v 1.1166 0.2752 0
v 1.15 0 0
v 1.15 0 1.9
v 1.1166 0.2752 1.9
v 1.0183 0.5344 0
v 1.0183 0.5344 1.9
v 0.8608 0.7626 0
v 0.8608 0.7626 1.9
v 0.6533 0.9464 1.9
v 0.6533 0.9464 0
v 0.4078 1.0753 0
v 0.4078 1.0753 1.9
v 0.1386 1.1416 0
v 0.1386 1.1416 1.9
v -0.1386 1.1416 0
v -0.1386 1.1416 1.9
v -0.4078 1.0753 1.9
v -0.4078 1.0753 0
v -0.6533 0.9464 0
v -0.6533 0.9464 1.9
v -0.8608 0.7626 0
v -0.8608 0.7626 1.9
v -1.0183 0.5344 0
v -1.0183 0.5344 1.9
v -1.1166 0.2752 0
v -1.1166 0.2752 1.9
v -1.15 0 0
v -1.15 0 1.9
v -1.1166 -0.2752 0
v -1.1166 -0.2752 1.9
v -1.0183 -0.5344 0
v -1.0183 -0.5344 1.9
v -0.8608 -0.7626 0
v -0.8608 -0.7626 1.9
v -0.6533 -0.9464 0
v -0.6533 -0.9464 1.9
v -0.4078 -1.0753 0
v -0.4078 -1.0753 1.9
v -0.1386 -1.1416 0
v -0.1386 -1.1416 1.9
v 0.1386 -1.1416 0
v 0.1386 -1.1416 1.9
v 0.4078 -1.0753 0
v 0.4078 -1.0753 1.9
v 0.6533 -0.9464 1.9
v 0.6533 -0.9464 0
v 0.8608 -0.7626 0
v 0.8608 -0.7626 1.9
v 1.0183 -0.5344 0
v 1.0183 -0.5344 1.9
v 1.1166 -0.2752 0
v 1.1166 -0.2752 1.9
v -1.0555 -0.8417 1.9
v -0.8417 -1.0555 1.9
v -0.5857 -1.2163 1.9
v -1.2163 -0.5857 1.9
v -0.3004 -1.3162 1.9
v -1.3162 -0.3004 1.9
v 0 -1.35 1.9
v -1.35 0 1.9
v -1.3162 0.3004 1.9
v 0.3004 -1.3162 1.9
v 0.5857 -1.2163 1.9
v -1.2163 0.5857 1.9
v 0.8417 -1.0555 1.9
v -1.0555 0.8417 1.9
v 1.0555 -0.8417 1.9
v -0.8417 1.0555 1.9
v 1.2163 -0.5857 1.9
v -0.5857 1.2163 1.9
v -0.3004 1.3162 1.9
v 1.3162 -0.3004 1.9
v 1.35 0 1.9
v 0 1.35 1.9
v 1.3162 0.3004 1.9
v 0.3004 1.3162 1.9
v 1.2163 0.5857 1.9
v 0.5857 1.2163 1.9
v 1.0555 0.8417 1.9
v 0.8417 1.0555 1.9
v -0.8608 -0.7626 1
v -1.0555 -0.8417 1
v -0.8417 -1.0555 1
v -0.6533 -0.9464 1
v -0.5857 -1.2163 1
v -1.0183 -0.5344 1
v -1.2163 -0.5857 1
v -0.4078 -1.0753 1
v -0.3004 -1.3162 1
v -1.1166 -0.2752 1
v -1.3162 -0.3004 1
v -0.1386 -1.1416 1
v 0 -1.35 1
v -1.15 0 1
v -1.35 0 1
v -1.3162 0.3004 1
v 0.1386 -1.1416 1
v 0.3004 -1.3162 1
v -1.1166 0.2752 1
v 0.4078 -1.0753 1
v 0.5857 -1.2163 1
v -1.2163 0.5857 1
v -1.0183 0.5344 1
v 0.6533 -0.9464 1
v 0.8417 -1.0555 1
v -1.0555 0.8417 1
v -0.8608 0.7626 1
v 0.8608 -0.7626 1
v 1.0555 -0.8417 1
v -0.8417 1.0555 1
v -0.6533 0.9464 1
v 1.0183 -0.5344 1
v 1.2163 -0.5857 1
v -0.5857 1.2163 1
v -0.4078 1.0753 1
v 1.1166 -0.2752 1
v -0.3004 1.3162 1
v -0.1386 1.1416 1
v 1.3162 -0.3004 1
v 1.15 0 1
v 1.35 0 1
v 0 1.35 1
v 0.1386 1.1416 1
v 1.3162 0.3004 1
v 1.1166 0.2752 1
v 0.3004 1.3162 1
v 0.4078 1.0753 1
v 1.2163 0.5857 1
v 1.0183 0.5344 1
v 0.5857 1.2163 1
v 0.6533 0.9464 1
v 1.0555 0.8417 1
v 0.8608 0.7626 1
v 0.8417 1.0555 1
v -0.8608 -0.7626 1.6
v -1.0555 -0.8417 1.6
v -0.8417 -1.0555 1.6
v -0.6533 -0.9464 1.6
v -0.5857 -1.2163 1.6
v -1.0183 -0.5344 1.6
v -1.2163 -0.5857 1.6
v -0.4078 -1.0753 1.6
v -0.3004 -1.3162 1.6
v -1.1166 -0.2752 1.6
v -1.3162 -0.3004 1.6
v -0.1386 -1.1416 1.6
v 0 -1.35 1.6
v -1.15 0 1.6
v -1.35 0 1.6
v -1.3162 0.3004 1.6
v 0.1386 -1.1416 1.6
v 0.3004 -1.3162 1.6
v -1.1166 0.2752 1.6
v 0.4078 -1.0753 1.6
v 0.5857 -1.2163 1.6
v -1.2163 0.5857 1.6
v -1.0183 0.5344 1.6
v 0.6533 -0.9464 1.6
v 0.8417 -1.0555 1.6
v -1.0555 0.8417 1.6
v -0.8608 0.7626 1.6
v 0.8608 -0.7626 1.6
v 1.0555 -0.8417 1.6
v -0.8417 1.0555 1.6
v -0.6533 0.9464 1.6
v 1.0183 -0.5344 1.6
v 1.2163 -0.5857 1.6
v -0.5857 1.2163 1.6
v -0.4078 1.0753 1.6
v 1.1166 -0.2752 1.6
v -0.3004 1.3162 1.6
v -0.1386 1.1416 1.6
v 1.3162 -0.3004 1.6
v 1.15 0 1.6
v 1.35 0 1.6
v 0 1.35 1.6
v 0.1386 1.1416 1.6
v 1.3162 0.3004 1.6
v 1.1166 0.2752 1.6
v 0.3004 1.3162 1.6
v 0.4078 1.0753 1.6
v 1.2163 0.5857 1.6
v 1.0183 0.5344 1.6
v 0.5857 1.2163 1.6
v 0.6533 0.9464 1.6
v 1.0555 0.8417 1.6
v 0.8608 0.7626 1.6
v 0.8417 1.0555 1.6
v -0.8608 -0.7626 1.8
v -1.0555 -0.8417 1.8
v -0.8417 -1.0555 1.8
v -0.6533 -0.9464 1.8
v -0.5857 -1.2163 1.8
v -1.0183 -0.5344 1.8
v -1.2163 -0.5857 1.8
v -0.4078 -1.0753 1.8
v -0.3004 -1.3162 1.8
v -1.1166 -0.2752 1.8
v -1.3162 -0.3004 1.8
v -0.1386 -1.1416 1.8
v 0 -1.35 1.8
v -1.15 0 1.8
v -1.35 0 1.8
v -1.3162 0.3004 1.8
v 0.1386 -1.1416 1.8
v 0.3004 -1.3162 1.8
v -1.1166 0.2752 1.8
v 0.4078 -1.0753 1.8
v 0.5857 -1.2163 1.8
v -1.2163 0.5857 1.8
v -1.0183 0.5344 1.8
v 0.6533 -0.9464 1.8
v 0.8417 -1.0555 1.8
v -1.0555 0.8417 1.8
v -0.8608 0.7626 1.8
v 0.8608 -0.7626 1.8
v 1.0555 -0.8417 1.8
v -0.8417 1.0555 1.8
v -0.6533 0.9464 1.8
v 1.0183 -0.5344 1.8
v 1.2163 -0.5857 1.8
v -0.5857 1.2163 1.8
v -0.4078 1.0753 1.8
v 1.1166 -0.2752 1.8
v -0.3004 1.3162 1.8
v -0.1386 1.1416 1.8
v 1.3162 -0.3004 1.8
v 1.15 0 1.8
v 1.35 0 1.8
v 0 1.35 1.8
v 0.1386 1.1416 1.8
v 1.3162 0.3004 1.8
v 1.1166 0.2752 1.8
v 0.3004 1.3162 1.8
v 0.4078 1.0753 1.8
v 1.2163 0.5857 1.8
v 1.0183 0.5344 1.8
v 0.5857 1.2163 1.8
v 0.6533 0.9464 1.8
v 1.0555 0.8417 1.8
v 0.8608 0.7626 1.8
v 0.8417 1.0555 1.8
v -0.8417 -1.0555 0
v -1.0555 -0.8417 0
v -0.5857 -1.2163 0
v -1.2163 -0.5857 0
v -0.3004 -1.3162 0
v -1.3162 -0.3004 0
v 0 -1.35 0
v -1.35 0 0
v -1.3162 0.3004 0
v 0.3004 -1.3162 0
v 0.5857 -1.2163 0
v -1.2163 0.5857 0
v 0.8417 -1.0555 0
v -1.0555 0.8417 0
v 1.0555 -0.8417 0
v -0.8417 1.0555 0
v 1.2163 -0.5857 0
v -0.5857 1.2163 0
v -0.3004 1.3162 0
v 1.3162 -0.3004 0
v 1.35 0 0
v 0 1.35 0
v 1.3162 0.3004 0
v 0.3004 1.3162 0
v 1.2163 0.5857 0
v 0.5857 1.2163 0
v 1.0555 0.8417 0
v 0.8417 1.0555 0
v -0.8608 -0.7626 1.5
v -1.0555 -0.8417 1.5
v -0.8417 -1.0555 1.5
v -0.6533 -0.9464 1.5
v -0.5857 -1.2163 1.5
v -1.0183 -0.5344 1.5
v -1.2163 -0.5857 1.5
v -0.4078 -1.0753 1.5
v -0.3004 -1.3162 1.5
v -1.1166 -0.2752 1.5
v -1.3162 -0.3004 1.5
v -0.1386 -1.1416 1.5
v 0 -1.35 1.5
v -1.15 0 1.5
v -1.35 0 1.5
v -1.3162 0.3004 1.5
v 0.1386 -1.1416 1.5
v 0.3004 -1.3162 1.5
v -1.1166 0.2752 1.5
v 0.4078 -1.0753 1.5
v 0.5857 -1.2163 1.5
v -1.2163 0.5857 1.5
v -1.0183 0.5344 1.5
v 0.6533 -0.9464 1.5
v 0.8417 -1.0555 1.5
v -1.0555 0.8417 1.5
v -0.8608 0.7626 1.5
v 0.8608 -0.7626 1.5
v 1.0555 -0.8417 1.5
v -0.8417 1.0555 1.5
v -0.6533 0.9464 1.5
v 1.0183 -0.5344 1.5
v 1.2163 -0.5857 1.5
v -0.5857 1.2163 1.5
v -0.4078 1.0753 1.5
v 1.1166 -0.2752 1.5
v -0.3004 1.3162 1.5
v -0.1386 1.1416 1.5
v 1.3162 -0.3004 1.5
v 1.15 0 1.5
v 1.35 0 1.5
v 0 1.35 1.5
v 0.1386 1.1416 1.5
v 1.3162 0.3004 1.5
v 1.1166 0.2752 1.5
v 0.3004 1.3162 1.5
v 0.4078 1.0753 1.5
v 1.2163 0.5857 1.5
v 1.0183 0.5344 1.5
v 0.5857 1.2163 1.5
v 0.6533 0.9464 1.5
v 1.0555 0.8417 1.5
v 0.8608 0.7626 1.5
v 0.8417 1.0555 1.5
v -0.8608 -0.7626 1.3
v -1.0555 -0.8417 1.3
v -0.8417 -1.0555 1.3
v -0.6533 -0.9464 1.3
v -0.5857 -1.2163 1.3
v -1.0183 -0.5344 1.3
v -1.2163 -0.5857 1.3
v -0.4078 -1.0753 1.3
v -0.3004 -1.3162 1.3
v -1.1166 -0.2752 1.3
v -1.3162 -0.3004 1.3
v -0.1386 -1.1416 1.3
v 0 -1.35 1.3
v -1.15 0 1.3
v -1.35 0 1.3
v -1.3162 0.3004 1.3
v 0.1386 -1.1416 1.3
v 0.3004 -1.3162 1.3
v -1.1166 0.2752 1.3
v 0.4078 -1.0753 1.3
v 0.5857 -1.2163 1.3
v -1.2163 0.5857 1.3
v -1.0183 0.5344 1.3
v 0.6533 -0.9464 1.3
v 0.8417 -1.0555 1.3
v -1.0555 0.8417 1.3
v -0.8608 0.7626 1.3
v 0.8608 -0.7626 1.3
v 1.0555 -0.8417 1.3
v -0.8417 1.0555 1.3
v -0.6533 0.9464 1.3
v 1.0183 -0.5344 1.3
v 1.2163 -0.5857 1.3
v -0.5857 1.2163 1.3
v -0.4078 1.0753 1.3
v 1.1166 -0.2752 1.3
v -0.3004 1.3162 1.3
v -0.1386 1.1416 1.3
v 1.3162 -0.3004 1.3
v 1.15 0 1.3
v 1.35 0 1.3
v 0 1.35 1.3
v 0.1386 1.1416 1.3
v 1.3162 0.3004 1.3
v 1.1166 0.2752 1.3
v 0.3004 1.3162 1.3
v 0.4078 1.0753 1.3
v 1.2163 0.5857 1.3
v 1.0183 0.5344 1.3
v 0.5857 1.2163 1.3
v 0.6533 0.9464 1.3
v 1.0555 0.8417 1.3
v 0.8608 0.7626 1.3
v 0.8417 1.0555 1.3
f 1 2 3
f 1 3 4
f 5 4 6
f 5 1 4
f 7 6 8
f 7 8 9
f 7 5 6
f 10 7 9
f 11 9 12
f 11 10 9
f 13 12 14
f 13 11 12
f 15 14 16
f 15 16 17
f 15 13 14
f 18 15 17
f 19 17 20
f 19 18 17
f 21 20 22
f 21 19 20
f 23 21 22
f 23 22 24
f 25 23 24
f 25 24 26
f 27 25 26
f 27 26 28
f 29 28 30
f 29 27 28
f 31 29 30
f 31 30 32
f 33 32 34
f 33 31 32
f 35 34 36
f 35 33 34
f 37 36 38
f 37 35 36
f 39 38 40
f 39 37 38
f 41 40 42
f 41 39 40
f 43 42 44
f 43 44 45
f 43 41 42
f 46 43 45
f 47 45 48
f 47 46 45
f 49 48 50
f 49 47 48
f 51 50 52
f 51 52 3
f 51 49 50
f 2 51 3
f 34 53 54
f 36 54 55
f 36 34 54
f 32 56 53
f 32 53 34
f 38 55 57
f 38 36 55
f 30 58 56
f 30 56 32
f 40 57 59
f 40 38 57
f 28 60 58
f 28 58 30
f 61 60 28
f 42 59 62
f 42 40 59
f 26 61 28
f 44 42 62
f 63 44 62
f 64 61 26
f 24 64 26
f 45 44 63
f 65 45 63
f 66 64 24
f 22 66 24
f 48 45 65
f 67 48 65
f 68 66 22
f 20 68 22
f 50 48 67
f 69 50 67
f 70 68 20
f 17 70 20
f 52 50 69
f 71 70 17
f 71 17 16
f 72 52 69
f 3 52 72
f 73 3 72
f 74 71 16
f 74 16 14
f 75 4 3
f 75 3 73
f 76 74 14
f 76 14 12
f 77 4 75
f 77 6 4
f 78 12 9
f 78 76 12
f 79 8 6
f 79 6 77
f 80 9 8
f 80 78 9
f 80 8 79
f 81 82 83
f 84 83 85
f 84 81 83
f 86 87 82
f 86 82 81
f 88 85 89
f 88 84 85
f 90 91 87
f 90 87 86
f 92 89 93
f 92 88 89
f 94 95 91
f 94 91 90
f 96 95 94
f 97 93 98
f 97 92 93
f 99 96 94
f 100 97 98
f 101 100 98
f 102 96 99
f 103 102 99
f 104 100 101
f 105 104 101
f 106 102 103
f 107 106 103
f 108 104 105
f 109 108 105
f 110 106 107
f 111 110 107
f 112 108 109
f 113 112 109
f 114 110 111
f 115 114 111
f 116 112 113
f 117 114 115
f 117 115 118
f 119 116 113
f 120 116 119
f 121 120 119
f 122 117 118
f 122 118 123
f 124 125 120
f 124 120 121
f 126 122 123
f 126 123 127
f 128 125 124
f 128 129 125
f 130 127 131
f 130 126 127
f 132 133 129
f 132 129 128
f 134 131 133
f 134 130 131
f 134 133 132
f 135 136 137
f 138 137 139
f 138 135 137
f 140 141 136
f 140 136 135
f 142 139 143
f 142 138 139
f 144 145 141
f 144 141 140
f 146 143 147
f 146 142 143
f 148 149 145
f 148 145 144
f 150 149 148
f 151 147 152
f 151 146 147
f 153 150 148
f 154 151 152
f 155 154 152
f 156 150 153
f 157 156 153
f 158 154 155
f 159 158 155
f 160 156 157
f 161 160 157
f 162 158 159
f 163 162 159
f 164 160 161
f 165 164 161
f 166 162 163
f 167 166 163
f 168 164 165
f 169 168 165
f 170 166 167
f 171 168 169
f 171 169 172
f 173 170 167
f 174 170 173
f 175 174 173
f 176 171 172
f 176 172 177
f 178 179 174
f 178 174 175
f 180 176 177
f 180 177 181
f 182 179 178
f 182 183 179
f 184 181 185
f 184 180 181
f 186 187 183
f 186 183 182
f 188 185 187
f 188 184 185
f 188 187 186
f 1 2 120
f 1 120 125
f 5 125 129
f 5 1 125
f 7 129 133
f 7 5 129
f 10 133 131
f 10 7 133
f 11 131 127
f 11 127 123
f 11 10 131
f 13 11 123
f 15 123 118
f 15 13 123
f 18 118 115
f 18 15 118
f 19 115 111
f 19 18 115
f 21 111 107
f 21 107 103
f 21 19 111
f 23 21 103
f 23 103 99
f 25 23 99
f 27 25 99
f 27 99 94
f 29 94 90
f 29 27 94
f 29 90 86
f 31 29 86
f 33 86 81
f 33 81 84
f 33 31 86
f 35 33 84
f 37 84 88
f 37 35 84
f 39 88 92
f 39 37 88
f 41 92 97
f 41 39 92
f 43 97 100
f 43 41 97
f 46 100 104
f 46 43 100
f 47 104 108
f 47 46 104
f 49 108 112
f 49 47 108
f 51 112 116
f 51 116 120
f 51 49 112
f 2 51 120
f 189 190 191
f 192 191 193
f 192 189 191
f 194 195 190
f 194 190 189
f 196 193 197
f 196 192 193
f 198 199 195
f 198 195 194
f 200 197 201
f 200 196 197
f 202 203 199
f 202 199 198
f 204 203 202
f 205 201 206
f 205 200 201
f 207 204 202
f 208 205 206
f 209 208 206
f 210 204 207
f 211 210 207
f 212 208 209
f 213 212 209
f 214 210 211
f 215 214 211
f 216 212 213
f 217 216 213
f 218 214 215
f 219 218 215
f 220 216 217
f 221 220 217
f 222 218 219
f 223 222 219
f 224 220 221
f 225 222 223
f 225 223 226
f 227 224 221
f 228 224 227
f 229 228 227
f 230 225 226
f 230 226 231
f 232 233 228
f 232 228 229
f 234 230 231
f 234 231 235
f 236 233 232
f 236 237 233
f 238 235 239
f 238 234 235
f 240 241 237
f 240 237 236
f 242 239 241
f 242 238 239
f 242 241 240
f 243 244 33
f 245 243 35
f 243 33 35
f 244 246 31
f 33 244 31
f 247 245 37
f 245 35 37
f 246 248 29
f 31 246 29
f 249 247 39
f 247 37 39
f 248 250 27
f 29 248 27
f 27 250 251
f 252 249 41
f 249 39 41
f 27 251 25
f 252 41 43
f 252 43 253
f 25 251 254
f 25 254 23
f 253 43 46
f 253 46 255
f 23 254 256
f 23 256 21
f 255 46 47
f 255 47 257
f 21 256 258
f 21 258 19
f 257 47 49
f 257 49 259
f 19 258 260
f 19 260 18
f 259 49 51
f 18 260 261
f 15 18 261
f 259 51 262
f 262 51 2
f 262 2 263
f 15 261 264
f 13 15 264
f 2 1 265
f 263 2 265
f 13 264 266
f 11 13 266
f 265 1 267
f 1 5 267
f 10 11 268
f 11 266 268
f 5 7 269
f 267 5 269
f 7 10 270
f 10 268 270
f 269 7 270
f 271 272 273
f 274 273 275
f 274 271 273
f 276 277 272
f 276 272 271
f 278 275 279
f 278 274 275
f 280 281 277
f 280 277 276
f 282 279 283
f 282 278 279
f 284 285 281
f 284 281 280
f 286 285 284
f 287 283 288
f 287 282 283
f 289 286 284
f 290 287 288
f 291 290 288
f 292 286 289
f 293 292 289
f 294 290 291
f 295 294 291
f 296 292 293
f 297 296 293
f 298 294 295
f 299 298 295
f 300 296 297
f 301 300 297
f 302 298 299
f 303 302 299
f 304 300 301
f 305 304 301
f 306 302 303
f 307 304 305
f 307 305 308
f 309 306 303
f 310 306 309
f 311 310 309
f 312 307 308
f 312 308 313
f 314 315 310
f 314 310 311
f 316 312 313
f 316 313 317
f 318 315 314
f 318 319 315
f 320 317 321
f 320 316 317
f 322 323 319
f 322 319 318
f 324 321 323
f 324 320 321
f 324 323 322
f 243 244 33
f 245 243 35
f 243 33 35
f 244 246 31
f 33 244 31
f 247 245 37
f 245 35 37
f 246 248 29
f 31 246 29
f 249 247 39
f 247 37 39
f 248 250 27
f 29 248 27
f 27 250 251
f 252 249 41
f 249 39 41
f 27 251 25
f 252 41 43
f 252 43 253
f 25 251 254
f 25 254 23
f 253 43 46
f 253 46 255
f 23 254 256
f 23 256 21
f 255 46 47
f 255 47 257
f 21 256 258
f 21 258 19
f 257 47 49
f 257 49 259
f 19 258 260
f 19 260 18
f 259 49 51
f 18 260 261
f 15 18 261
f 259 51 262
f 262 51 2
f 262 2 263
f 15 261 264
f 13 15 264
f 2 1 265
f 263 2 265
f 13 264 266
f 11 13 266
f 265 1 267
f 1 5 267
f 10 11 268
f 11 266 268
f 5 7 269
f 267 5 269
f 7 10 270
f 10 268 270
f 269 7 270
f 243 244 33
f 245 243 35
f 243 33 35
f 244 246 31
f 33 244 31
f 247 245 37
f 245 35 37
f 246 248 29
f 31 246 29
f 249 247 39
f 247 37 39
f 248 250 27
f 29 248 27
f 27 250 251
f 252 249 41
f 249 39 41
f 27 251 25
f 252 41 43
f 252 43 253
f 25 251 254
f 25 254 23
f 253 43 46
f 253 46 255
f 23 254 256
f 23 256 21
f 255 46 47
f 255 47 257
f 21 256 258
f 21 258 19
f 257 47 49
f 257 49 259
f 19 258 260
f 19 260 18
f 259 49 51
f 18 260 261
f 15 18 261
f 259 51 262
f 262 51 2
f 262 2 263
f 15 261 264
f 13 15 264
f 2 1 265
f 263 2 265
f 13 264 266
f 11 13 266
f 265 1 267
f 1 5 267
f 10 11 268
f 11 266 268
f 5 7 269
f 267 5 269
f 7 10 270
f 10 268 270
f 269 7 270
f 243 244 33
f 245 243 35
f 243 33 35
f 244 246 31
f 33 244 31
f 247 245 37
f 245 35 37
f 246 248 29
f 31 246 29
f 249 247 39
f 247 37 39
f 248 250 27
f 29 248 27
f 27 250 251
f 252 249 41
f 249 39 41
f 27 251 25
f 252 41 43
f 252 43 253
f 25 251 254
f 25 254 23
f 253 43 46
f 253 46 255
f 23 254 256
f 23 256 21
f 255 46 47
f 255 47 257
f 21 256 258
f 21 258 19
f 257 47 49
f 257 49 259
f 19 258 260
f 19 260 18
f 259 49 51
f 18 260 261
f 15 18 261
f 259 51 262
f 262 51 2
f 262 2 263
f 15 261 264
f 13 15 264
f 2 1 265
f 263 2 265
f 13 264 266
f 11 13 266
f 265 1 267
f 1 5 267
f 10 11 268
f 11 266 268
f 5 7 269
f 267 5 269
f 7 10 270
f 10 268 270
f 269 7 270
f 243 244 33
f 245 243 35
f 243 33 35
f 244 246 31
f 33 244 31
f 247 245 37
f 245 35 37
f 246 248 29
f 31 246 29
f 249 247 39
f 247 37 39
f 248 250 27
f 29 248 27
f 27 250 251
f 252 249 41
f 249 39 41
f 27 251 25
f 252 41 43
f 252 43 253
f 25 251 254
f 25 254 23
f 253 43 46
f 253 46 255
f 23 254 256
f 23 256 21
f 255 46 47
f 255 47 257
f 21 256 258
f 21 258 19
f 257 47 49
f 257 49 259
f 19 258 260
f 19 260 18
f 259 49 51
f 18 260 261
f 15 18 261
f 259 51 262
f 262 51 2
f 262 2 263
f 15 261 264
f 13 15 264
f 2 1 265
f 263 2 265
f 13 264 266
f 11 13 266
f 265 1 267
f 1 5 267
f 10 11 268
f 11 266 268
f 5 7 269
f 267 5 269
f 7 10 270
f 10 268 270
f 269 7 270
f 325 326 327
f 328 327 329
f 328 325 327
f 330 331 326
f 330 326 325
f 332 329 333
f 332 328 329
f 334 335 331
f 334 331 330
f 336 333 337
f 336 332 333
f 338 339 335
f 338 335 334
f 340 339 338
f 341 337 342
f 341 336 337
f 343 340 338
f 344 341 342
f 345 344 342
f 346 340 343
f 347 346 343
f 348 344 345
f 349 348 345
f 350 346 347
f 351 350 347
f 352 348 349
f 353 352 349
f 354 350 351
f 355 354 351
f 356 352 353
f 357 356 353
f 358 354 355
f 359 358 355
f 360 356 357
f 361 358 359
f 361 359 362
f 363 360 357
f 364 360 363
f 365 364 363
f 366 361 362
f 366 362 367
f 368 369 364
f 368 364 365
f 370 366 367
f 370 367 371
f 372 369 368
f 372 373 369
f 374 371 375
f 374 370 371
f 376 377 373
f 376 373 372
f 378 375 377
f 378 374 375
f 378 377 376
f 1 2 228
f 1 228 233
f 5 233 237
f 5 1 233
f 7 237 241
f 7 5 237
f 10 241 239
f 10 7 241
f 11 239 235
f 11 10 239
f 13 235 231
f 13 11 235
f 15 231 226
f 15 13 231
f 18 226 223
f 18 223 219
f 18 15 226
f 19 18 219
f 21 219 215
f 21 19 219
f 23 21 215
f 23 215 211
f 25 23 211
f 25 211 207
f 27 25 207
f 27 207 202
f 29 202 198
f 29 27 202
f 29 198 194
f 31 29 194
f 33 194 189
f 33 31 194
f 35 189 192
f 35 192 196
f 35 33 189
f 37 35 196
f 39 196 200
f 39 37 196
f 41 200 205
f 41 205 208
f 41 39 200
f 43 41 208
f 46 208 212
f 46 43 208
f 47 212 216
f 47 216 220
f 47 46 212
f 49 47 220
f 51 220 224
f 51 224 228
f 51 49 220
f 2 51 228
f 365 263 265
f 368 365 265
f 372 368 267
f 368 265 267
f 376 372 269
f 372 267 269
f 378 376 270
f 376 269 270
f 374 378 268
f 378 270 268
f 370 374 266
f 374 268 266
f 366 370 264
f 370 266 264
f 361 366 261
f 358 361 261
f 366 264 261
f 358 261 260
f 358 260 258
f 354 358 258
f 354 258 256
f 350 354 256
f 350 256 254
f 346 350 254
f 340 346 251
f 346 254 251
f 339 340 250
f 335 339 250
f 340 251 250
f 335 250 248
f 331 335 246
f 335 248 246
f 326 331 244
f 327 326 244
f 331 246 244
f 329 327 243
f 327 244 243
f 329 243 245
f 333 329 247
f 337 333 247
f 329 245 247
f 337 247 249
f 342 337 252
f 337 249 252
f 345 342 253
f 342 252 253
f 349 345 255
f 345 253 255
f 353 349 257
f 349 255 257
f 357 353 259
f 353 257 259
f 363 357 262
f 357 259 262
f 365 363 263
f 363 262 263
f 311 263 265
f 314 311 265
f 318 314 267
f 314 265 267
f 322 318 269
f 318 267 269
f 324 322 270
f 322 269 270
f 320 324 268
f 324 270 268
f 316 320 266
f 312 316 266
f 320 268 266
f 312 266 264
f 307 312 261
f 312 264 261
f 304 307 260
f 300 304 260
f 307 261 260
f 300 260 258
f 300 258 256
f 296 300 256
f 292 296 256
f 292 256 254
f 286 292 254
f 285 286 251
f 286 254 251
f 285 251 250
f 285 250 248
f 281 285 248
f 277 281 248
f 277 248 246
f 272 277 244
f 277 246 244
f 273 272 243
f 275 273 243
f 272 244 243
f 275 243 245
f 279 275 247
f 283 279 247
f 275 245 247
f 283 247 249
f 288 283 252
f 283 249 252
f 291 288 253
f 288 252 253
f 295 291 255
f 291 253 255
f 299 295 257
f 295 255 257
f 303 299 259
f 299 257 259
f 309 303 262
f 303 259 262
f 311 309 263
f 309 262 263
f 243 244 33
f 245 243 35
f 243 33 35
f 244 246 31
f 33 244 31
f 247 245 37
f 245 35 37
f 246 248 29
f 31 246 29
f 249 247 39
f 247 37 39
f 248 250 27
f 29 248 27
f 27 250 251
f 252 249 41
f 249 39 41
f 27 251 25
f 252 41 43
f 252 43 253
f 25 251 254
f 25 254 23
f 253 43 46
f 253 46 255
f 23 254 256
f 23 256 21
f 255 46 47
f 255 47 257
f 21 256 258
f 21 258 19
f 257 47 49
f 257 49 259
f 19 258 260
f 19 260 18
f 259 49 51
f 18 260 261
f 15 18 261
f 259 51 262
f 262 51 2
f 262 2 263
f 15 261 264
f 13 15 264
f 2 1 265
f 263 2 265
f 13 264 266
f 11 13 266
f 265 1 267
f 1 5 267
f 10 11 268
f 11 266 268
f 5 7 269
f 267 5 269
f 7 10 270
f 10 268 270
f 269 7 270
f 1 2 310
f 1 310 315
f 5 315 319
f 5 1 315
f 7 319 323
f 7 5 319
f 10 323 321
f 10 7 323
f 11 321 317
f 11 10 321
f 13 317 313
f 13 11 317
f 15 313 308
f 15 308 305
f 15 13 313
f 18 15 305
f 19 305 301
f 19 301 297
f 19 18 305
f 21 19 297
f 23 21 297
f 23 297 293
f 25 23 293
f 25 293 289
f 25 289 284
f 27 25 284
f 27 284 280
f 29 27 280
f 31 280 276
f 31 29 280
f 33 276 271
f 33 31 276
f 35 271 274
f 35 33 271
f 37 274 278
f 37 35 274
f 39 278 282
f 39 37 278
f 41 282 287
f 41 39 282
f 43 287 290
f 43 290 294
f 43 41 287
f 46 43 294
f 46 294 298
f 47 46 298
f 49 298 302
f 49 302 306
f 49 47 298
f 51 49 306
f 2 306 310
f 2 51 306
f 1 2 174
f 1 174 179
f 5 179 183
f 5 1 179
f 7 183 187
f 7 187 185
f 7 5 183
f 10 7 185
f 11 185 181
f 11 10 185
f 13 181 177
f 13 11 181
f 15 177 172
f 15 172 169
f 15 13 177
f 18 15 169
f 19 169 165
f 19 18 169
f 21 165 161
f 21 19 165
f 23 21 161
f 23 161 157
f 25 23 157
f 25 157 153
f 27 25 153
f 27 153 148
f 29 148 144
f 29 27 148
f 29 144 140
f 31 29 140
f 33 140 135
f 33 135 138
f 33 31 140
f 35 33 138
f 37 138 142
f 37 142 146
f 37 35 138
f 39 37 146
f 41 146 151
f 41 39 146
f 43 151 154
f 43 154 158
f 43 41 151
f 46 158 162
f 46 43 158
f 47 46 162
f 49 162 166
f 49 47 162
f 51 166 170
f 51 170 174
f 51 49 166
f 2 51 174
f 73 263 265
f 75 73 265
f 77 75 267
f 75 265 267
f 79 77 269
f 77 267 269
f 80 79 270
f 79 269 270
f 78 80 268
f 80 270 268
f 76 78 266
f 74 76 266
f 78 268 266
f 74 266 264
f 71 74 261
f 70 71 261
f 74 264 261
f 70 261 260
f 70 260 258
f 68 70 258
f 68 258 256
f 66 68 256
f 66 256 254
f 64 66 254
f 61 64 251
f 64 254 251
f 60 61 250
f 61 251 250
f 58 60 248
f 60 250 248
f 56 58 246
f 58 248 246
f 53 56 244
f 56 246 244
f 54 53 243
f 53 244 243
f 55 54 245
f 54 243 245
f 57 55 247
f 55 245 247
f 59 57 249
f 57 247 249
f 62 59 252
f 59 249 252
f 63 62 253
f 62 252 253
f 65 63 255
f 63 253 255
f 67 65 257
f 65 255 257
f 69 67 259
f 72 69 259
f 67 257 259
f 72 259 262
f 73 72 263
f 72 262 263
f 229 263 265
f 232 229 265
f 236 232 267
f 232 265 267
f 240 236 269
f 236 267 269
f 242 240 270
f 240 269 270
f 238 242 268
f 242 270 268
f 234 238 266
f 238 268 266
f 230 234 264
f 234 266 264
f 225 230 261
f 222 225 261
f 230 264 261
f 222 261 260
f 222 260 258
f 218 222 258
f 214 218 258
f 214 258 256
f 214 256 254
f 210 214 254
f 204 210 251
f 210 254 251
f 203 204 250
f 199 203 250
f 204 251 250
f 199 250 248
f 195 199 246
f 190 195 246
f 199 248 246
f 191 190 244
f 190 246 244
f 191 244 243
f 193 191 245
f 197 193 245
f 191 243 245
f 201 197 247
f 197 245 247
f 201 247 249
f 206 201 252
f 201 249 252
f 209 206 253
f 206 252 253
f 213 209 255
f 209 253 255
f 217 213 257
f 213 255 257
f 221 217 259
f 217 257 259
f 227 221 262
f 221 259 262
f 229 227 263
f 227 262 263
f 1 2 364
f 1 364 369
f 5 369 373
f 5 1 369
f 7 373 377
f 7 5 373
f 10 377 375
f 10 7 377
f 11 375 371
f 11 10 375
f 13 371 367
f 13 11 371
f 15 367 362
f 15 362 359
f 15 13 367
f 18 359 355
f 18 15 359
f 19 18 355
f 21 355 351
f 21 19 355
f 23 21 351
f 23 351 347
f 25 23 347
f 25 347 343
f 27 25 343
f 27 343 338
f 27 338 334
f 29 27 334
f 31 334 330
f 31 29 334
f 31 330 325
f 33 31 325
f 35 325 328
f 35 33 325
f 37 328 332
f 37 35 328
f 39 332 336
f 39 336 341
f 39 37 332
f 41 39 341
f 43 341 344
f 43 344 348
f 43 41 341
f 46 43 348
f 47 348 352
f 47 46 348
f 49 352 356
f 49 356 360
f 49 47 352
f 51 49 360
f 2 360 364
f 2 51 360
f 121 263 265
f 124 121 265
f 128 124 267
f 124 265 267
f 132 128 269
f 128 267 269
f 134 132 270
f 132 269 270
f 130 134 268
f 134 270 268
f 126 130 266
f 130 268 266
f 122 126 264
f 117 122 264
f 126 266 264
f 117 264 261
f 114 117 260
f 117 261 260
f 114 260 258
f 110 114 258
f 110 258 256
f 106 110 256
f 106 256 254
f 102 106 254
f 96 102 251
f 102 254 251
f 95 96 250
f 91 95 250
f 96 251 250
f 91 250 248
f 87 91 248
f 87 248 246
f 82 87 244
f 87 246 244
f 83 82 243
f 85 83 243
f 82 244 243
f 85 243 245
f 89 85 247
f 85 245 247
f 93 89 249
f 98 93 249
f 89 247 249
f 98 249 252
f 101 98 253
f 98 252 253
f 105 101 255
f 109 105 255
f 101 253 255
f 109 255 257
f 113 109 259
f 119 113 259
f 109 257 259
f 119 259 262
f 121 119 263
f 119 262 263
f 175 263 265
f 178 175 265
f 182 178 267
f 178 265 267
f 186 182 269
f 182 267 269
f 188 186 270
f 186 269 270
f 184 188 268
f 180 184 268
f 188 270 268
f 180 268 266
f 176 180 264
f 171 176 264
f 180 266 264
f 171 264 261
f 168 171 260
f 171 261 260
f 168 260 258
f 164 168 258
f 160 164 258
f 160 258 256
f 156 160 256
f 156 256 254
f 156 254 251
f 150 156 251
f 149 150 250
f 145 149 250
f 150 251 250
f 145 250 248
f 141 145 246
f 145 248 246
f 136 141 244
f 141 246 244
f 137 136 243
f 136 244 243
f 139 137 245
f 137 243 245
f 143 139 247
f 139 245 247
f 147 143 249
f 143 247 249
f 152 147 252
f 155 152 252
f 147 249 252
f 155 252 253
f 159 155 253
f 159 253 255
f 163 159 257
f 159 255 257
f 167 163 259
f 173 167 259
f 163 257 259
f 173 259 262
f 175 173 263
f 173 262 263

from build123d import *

# Parameters (mm, degrees)
F0_R     = 1.35
F0_R_2   = 1.15
F1_DEPTH = 1.5
F2_DEPTH = 1.6
F3_DEPTH = 1.8
F4_DEPTH = 1.9
F5_DEPTH = 1.3
F6_DEPTH = 1


with BuildPart() as f1:
    # F0 (on Top) → F1 (new body)
    with BuildSketch(Plane.XY):
        Circle(F0_R)
        Circle(F0_R_2, mode=Mode.SUBTRACT)
    extrude(amount=F1_DEPTH)


with BuildPart() as f2:
    # F0 (on Top) → F2 (new body)
    with BuildSketch(Plane.XY):
        Circle(F0_R)
        Circle(F0_R_2, mode=Mode.SUBTRACT)
    extrude(amount=F2_DEPTH)


with BuildPart() as f3:
    # F0 (on Top) → F3 (new body)
    with BuildSketch(Plane.XY):
        Circle(F0_R)
        Circle(F0_R_2, mode=Mode.SUBTRACT)
    extrude(amount=F3_DEPTH)


with BuildPart() as f4:
    # F0 (on Top) → F4 (new body)
    with BuildSketch(Plane.XY):
        Circle(F0_R)
        Circle(F0_R_2, mode=Mode.SUBTRACT)
    extrude(amount=F4_DEPTH)


with BuildPart() as f5:
    # F0 (on Top) → F5 (new body)
    with BuildSketch(Plane.XY):
        Circle(F0_R)
        Circle(F0_R_2, mode=Mode.SUBTRACT)
    extrude(amount=F5_DEPTH)


with BuildPart() as f6:
    # F0 (on Top) → F6 (new body)
    with BuildSketch(Plane.XY):
        Circle(F0_R)
        Circle(F0_R_2, mode=Mode.SUBTRACT)
    extrude(amount=F6_DEPTH)


solid = Compound([f1.part, f2.part, f3.part, f4.part, f5.part, f6.part])
